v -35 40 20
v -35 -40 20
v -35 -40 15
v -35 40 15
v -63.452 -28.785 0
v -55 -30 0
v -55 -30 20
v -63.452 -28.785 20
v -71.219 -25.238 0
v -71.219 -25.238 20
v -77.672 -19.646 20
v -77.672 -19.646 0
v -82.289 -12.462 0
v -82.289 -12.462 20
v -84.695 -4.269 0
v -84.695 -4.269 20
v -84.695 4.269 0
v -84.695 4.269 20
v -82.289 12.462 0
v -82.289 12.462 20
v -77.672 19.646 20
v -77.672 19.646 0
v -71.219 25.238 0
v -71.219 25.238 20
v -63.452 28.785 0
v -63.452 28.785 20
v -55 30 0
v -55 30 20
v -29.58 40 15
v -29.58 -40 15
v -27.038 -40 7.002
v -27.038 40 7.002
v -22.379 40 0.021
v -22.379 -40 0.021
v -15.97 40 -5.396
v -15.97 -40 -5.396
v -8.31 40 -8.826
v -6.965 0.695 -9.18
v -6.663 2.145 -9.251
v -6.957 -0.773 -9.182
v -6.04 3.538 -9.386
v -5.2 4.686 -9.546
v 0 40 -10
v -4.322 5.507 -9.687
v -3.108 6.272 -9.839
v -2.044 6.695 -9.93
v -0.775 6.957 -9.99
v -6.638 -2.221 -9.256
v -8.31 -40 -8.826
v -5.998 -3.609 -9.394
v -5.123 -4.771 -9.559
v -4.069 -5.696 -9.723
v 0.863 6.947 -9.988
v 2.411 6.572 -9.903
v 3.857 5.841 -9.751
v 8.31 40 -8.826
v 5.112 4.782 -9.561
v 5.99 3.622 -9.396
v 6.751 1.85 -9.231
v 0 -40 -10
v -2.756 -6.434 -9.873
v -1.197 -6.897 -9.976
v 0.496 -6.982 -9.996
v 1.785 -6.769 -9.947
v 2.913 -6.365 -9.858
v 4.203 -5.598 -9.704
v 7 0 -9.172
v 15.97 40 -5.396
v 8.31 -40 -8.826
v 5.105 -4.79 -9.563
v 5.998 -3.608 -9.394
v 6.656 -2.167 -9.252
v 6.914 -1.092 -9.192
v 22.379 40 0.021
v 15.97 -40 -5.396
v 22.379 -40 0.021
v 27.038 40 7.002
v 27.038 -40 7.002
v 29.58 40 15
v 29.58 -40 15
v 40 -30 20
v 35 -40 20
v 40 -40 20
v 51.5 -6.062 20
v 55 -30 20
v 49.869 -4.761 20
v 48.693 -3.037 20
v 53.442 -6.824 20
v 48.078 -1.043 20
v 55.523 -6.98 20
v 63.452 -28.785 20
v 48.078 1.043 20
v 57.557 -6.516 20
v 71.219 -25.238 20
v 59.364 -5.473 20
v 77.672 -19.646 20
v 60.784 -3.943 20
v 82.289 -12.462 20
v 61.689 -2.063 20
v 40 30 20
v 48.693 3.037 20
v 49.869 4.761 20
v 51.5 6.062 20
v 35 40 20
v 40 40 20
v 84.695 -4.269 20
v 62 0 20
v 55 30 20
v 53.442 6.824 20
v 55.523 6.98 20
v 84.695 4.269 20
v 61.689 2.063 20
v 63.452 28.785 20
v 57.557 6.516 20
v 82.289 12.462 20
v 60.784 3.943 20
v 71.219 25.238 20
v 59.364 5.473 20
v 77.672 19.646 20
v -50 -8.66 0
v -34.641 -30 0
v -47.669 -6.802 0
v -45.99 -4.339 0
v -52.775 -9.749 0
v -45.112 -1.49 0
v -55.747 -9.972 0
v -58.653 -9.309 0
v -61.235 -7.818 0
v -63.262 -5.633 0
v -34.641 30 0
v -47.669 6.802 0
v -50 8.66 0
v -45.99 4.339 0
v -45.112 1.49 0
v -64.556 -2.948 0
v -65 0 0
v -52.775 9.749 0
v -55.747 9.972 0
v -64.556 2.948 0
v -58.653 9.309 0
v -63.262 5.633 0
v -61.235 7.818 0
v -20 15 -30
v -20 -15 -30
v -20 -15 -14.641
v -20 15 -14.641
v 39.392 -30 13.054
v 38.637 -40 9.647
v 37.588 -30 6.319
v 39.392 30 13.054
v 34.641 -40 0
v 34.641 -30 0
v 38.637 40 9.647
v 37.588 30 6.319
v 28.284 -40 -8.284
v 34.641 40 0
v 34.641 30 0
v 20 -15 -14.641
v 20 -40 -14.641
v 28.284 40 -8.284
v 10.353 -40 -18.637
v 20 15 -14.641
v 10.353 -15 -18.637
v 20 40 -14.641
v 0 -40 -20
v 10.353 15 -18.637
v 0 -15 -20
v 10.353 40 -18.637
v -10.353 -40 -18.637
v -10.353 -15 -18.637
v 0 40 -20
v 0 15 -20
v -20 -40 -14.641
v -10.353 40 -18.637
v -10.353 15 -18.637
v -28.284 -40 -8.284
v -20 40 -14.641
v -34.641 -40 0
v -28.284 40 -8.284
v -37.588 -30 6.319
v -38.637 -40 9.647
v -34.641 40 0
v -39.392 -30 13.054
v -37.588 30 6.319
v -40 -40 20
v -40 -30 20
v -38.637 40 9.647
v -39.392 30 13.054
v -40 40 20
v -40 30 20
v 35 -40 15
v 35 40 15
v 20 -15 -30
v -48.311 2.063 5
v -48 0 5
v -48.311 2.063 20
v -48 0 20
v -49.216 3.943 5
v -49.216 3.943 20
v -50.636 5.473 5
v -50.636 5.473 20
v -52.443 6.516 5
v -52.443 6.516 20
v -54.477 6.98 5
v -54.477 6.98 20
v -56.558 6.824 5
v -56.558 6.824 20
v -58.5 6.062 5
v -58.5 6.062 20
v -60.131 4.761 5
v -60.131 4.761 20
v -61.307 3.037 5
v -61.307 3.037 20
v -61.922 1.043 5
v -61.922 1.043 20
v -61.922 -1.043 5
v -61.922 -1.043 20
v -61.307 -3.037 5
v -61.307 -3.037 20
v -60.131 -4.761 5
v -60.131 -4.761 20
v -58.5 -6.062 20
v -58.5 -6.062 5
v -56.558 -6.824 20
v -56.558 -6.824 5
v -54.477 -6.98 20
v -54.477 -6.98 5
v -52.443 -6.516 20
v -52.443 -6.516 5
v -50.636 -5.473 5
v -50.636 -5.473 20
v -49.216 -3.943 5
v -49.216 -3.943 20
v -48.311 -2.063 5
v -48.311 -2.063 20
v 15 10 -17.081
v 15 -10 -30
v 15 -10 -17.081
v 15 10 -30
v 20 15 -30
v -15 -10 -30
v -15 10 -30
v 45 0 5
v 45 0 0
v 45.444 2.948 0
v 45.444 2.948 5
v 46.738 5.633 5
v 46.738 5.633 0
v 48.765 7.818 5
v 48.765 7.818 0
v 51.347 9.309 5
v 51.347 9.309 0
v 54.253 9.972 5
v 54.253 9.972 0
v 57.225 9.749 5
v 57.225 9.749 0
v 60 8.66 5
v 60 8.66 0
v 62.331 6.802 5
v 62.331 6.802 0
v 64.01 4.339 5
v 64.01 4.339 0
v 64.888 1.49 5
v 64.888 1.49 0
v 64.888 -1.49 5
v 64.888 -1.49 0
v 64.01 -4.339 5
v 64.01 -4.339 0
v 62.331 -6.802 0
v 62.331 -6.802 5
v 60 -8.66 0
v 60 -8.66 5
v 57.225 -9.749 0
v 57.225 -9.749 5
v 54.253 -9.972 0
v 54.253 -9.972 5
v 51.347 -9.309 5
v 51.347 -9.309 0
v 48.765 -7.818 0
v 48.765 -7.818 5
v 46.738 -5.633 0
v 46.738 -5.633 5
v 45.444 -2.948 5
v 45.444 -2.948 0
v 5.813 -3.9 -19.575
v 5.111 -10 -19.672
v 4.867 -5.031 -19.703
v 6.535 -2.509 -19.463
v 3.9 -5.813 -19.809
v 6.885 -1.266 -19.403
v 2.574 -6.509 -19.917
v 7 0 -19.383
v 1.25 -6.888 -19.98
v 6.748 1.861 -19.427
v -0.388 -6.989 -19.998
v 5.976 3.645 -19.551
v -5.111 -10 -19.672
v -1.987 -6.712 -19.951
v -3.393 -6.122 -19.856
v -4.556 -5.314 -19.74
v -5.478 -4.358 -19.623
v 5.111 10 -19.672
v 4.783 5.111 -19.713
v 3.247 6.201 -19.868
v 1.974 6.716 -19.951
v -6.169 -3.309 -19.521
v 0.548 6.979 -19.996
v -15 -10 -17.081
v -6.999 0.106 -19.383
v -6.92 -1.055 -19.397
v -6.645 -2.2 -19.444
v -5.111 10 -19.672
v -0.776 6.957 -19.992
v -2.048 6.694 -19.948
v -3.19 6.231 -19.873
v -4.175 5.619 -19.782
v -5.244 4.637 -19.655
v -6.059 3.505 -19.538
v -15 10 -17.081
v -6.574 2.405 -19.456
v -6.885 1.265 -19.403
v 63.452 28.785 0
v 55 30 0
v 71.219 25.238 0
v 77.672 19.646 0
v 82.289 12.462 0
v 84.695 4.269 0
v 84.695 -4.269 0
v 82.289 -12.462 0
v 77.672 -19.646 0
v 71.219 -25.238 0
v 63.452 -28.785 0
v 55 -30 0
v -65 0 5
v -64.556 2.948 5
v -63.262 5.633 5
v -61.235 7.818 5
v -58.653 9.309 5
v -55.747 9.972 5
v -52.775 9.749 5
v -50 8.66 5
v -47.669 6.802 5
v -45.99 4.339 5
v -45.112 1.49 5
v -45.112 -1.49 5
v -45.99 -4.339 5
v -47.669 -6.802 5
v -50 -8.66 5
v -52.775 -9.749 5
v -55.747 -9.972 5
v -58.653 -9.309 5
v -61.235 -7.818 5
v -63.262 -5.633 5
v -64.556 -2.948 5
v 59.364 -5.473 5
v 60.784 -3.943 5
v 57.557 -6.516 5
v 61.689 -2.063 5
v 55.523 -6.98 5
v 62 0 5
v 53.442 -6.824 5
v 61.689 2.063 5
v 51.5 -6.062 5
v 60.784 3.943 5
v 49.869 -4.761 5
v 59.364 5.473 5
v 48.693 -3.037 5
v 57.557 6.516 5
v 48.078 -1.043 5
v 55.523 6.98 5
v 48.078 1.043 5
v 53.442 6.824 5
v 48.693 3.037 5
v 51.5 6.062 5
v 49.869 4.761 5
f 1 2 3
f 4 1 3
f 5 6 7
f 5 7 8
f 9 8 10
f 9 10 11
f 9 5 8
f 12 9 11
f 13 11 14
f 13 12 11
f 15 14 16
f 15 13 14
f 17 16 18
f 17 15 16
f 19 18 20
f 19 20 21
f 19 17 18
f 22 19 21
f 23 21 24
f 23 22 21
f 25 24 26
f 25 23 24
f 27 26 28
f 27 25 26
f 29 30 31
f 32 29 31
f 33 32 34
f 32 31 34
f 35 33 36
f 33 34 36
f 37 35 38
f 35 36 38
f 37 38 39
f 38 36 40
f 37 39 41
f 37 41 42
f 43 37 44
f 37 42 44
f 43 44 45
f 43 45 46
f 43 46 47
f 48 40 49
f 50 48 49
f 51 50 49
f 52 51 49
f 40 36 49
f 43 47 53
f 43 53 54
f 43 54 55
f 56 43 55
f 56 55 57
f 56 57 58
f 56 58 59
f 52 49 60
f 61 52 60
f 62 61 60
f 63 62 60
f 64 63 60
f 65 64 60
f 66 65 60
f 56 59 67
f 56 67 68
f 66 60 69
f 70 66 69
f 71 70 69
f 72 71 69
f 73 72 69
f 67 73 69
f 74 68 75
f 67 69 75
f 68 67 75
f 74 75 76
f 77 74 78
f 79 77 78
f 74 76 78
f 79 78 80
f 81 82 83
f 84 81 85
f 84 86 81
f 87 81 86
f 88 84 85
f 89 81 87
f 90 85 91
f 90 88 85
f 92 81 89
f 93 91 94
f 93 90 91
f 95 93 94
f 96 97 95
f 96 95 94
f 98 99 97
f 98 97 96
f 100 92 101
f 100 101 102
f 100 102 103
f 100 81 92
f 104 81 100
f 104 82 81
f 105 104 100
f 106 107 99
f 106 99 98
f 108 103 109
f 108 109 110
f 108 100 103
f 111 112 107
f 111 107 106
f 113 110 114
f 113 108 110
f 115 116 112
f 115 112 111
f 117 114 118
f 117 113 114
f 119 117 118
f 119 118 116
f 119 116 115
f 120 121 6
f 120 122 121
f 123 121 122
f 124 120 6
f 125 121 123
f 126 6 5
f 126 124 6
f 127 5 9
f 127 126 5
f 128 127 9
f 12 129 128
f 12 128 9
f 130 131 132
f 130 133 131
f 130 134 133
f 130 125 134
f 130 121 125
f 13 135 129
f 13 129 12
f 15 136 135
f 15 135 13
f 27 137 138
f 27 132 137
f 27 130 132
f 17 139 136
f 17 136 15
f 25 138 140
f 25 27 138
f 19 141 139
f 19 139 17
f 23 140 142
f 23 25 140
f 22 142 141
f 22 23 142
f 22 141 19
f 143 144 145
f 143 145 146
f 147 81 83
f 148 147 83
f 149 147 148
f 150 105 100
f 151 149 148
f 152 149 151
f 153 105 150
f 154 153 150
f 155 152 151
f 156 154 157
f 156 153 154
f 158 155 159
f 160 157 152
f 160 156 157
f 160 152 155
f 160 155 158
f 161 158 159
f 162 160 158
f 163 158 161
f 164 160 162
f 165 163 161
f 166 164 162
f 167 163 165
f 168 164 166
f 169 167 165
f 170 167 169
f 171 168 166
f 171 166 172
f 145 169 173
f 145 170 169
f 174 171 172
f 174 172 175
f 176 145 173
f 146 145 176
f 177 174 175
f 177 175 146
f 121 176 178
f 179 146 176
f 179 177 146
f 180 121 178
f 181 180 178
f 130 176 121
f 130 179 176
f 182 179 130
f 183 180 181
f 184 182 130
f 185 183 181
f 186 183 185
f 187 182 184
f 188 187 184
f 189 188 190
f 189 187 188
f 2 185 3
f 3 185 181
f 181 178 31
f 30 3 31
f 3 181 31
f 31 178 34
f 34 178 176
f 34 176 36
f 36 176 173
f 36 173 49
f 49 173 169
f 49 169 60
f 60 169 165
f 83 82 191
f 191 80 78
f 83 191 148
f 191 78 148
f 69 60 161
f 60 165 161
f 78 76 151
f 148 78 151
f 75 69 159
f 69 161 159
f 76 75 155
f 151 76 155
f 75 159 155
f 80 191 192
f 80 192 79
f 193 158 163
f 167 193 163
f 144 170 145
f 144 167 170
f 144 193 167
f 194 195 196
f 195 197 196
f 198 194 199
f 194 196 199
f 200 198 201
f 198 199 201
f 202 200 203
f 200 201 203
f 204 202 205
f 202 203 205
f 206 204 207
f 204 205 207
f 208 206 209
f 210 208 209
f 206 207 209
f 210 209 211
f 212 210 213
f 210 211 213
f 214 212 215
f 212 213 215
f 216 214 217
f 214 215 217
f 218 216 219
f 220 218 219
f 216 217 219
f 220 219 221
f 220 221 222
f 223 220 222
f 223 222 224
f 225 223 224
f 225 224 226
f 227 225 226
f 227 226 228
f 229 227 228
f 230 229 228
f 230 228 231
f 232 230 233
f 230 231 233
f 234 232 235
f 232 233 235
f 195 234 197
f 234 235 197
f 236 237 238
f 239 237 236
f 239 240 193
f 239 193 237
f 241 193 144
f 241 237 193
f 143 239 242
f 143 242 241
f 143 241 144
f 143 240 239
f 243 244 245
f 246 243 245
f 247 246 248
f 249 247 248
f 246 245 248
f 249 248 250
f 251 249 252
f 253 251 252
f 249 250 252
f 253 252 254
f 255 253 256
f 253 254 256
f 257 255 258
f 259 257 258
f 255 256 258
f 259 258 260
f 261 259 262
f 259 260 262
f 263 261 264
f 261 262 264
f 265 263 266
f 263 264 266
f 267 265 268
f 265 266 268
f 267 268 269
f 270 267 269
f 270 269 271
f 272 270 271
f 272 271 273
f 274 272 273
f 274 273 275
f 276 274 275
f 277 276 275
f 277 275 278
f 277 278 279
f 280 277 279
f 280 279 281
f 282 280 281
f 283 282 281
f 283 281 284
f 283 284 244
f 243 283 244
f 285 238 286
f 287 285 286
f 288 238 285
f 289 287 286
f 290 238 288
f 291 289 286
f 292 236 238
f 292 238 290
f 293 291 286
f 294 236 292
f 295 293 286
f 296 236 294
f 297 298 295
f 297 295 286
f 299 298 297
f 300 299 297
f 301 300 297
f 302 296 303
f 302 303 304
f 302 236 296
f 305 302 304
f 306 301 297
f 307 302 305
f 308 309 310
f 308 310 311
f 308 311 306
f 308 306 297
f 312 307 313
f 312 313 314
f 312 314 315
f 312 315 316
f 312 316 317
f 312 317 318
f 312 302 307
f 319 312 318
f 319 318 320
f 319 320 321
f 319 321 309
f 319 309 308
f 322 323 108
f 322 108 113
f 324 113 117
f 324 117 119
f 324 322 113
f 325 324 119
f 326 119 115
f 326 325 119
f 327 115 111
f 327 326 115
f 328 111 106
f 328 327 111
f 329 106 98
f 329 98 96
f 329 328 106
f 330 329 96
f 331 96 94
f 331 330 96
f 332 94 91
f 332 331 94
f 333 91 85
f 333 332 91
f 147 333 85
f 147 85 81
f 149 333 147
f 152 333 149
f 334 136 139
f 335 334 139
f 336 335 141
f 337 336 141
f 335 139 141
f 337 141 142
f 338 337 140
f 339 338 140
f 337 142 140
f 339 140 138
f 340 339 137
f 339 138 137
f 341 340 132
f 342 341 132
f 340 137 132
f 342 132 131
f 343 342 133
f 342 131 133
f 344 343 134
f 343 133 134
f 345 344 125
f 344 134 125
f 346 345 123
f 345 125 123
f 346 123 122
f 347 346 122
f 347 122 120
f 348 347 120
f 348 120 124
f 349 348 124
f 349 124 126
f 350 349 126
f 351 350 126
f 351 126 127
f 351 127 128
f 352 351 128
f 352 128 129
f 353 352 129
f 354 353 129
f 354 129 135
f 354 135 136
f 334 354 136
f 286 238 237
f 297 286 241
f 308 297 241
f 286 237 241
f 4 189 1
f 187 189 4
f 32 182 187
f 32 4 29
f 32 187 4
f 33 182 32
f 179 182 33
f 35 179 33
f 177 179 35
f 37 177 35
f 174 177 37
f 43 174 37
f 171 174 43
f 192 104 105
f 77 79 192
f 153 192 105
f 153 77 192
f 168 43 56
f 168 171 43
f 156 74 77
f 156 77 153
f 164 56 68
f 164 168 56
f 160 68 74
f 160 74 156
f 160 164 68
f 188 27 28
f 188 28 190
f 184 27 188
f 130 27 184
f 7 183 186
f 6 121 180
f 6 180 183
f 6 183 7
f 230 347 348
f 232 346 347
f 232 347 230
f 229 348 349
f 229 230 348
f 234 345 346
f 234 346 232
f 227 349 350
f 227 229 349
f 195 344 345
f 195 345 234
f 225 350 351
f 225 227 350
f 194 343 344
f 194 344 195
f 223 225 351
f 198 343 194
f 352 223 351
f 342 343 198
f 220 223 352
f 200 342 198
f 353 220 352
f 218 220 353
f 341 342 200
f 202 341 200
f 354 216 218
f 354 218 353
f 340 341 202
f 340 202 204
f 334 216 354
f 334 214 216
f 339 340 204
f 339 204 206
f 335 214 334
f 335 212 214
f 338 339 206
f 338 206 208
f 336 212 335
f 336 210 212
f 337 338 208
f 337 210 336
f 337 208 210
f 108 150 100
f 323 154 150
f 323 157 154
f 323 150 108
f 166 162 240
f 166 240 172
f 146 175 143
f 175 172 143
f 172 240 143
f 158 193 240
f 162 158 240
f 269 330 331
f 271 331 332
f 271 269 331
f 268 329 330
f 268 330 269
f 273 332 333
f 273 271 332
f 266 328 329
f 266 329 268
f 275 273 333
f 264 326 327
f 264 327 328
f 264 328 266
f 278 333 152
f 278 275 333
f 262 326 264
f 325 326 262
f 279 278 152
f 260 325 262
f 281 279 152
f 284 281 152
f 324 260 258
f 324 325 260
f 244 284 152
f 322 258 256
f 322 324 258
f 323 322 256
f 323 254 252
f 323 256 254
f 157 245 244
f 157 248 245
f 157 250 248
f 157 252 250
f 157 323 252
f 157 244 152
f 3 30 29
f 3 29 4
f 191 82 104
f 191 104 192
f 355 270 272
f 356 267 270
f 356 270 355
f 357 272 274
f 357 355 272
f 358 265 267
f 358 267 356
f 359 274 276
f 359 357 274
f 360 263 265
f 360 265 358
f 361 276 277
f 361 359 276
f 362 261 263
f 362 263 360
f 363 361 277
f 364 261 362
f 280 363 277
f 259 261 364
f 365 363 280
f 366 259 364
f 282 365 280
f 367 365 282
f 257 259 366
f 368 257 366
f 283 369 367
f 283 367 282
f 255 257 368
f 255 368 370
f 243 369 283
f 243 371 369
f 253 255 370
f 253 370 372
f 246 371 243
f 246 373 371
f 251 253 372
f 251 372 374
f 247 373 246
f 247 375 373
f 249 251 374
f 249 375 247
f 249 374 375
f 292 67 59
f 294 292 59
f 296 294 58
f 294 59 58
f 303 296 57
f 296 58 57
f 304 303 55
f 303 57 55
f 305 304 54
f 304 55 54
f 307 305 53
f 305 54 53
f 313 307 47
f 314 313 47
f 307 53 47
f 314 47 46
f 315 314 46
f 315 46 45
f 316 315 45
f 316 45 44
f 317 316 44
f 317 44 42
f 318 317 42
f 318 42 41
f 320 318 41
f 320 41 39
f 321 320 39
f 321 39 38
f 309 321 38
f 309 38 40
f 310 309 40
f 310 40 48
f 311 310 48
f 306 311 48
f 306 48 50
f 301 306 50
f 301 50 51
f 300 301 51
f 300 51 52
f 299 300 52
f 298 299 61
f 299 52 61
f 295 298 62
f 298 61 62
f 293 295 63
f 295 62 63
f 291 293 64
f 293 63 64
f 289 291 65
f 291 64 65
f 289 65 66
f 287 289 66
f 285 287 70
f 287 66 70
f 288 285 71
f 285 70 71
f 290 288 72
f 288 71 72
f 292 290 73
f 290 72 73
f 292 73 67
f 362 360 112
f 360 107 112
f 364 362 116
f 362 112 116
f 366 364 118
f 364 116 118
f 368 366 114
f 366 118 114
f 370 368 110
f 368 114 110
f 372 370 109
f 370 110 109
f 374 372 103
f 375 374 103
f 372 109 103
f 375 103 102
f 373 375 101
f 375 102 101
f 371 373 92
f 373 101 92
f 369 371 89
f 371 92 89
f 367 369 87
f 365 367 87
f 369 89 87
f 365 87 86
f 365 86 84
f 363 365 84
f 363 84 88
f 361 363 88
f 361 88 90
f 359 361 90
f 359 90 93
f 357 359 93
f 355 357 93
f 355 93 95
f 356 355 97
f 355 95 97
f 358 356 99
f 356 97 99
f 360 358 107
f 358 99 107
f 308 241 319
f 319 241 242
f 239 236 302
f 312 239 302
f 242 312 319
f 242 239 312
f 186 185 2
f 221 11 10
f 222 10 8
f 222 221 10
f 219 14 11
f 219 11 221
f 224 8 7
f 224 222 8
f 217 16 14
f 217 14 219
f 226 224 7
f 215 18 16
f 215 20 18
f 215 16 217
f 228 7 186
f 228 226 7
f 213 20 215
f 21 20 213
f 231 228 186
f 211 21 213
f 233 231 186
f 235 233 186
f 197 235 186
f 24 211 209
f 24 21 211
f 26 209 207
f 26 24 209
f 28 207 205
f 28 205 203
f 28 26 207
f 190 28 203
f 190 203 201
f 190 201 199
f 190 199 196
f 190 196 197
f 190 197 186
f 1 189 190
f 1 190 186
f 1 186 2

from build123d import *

# Parameters (mm, degrees)
BOSS_EXTRUDE1_DEPTH      = 20
BOSS_EXTRUDE2_DEPTH      = 40
CUT_EXTRUDE1_REACH       = 120.427
SKETCH6_R                = 30
BOSS_EXTRUDE3_REACH      = 108.419
BOSS_EXTRUDE3_END_RADIUS = 40
SKETCH7_W                = 40
SKETCH7_H                = 30
SKETCH7_W_2              = 30
SKETCH7_H_2              = 20
SKETCH8_W                = 70
SKETCH8_H                = 5
CUT_EXTRUDE2_DEPTH       = 121.519707932
HOLE1_D                  = 14
HOLE2_D                  = 14
HOLE2_DEPTH              = 20
HOLE2_CBORE_D            = 20
HOLE2_CBORE_DEPTH        = 5
HOLE2_TIP                = 4.206024333


with BuildPart() as part:
    # Sketch1 → Boss-Extrude1 (new body)
    with BuildSketch(Plane.XY):
        with BuildLine():
            Line((-55, 30), (55, 30))
            ThreePointArc((55, 30), (85, 0), (55, -30))
            Line((55, -30), (-55, -30))
            ThreePointArc((-55, -30), (-85, 0), (-55, 30))
        make_face()
    extrude(amount=BOSS_EXTRUDE1_DEPTH)

    # Sketch5 → Boss-Extrude2 (add, symmetric)
    with BuildSketch(Plane(origin=(0, 0, 0), x_dir=(1, 0, 0), z_dir=(0, 1, 0))):
        with BuildLine():
            Line((-40, -20), (40, -20))
            ThreePointArc((40, -20), (0, 20), (-40, -20))
        make_face()
    extrude(amount=BOSS_EXTRUDE2_DEPTH, both=True)

    # Sketch6 → Cut-Extrude1 (cut, up to next)
    with BuildSketch(Plane(origin=(0, -40, 0), x_dir=(-1, 0, 0), z_dir=(0, -1, 0)), mode=Mode.PRIVATE) as cut_extrude1_sk1:
        with Locations((0, -20)):
            Circle(SKETCH6_R)
    cut_extrude1_tool1 = extrude(cut_extrude1_sk1.sketch, amount=-CUT_EXTRUDE1_REACH, mode=Mode.PRIVATE) & part.part
    add(cut_extrude1_tool1.solids().sort_by_distance((0, -40, 20))[0], mode=Mode.SUBTRACT)

    # Boss-Extrude3: up to this cylinder (the profile starts outside it)
    boss_extrude3_end = Plane(origin=(0, 14.5, 20), z_dir=(0, -1, 0)) * Cylinder(BOSS_EXTRUDE3_END_RADIUS, 297.838, mode=Mode.PRIVATE)
    # Sketch7 → Boss-Extrude3 (add, up to the surface)
    with BuildSketch(Plane(origin=(0, 0, -30), x_dir=(-1, 0, 0), z_dir=(0, 0, -1)), mode=Mode.PRIVATE) as boss_extrude3_sk1:
        Rectangle(SKETCH7_W, SKETCH7_H)
        Rectangle(SKETCH7_W_2, SKETCH7_H_2, mode=Mode.SUBTRACT)
    boss_extrude3_tool1 = extrude(boss_extrude3_sk1.sketch, amount=-BOSS_EXTRUDE3_REACH, mode=Mode.PRIVATE) - boss_extrude3_end
    add(boss_extrude3_tool1.solids().sort_by_distance((0, 14.5, -30))[0])

    # Sketch8 → Cut-Extrude2 (cut, through all)
    with BuildSketch(Plane(origin=(0, -40, 0), x_dir=(-1, 0, 0), z_dir=(0, -1, 0))):
        with Locations((0, -17.5)):
            Rectangle(SKETCH8_W, SKETCH8_H)
    extrude(amount=-CUT_EXTRUDE2_DEPTH, mode=Mode.SUBTRACT)

    # Hole1 (through all)
    with Locations(Plane(origin=(0, 0, -30), x_dir=(-1, 0, 0), z_dir=(0, 0, -1))):
        with Locations((0, 0)):
            Hole(HOLE1_D / 2)

    # Hole2
    with Locations(Plane(origin=(0, 0, 0), x_dir=(-1, 0, 0), z_dir=(0, 0, -1))):
        with Locations((-55, 0), (55, 0)):
            CounterBoreHole(HOLE2_D / 2, HOLE2_CBORE_D / 2, HOLE2_CBORE_DEPTH, depth=HOLE2_DEPTH)
            with Locations((0, 0, -(HOLE2_DEPTH + HOLE2_TIP / 2))):  # 118° drill point
                Cone(0, HOLE2_D / 2, HOLE2_TIP, mode=Mode.SUBTRACT)


solid = part.part
